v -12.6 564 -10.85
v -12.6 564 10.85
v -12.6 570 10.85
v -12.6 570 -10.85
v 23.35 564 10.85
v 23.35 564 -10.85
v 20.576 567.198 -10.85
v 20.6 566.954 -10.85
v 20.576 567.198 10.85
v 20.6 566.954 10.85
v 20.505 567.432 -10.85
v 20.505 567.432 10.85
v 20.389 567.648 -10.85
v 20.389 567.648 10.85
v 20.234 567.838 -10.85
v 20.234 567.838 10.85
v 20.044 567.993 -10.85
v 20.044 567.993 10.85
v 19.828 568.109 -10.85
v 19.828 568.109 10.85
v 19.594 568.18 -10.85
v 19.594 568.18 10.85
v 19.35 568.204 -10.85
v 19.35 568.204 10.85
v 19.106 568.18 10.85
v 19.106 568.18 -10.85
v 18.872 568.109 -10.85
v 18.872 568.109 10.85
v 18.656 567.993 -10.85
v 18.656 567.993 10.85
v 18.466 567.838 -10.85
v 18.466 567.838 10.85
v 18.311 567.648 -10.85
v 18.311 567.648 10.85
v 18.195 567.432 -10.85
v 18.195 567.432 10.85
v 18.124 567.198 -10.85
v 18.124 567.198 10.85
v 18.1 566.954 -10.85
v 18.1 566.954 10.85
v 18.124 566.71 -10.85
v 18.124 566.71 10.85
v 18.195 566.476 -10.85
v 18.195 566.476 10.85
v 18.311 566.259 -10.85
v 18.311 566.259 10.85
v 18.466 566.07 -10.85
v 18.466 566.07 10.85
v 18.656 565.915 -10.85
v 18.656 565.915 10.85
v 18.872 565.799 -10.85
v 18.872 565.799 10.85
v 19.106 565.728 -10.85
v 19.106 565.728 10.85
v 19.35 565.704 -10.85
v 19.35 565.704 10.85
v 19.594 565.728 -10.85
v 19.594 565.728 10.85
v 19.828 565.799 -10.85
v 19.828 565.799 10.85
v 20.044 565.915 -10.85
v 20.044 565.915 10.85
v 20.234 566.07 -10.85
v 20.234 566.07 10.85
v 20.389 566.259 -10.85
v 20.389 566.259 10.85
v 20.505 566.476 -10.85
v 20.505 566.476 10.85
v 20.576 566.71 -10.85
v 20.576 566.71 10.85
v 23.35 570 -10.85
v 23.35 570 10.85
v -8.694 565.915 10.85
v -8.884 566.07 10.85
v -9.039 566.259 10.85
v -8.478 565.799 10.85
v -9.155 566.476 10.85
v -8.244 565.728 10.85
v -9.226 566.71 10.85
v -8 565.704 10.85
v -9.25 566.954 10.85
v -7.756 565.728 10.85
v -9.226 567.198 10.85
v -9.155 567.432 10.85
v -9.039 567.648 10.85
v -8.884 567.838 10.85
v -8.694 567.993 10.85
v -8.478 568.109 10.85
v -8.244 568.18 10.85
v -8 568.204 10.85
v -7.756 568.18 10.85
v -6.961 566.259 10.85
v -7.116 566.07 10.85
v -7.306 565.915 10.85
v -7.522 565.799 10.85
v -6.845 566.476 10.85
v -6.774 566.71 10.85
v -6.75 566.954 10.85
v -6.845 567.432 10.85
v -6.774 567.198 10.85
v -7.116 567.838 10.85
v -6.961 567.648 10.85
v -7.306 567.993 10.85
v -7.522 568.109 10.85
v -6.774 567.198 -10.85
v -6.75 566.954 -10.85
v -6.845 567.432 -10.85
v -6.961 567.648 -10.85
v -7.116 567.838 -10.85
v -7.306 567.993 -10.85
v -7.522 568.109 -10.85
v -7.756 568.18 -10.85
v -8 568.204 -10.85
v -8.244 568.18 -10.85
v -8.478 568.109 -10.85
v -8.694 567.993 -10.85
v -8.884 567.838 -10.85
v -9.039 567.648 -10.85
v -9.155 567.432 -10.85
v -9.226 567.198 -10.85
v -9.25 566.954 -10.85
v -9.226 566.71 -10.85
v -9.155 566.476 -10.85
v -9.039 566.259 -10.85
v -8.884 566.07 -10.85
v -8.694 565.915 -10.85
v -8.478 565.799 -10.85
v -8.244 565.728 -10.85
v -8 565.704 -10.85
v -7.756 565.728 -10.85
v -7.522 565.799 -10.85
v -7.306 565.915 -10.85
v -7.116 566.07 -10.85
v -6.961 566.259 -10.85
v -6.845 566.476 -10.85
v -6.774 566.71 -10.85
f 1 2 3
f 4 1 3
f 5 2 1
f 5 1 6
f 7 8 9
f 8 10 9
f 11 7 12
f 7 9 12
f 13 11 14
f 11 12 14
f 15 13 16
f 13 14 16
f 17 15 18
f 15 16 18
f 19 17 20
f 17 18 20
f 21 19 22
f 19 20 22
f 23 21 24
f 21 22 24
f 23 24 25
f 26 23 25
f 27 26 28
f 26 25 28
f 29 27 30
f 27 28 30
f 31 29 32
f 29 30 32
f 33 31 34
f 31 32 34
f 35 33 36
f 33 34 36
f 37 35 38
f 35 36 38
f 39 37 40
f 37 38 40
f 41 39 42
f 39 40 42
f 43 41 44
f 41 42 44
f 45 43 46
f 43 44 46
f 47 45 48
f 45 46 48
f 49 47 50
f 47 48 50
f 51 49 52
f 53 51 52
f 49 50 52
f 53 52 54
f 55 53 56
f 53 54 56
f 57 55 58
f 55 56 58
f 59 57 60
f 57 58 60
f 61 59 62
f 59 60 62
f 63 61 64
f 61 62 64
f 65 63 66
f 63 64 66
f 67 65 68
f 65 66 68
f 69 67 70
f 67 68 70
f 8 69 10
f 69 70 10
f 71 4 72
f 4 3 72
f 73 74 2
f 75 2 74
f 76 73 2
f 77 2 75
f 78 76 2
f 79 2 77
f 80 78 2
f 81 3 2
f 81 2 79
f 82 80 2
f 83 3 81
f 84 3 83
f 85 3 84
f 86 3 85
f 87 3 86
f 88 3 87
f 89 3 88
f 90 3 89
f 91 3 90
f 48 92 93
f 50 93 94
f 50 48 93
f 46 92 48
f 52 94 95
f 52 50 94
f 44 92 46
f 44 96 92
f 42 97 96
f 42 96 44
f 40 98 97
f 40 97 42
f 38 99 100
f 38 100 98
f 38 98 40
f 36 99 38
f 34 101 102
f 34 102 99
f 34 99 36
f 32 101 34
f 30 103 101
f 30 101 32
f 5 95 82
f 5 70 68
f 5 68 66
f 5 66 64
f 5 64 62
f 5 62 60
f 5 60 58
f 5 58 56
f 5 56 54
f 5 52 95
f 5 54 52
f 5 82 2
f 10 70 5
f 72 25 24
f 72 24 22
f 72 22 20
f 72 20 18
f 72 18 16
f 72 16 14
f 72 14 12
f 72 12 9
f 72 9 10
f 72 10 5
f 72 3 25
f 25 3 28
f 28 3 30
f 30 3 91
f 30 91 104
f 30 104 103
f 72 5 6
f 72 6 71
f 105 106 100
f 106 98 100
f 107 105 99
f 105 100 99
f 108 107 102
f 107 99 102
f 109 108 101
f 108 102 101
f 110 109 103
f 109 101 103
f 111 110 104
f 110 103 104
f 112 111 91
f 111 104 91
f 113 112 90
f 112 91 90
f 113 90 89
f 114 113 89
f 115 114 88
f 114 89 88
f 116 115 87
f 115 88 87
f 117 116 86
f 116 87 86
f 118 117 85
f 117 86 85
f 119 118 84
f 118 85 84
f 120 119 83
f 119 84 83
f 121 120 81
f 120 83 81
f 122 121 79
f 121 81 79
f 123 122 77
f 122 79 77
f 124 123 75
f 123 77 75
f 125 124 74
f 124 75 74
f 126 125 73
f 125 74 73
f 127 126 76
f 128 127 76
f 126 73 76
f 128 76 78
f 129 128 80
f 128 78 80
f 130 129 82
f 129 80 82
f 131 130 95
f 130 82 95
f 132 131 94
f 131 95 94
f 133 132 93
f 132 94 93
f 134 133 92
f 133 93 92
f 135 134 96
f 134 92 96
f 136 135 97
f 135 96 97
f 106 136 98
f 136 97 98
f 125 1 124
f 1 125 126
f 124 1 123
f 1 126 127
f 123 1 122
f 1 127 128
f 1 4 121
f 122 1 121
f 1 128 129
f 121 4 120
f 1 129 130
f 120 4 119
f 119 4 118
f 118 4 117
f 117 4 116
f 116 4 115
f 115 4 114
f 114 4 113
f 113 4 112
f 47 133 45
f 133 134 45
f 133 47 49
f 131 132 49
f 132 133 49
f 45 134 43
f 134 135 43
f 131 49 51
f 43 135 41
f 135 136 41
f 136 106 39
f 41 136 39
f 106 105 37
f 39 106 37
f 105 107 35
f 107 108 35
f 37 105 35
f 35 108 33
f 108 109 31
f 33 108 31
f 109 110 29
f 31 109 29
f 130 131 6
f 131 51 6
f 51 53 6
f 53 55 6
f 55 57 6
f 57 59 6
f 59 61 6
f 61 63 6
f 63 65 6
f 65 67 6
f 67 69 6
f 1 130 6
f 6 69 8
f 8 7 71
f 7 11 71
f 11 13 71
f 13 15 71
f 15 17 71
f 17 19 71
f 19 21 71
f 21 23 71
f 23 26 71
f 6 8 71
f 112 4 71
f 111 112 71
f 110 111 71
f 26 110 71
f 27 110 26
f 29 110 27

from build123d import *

# Parameters (mm, degrees)
SIDE_W                               = 35.95
SIDE_H                               = 6
AUFSATZ_LINEAR_AUSTRAGEN1_DEPTH      = 10.85
AUFSATZ_LINEAR_AUSTRAGEN1_DEPTH_BACK = 10.85
SKIZZE5_R                            = 1.25
SCHNITT_LINEAR_AUSTRAGEN1_DEPTH      = 11.85
SCHNITT_LINEAR_AUSTRAGEN1_DEPTH_BACK = 11.85


with BuildPart() as part:
    # Side → Aufsatz-Linear austragen1 (new body, two sides)
    with BuildSketch(Plane.XY) as aufsatz_linear_austragen1_sk:
        with Locations((5.375, 567)):
            Rectangle(SIDE_W, SIDE_H)
    extrude(amount=AUFSATZ_LINEAR_AUSTRAGEN1_DEPTH)
    extrude(aufsatz_linear_austragen1_sk.sketch, amount=-AUFSATZ_LINEAR_AUSTRAGEN1_DEPTH_BACK)

    # Skizze5 → Schnitt-Linear austragen1 (cut, two sides)
    with BuildSketch(Plane.XY) as schnitt_linear_austragen1_sk:
        with Locations((-8, 566.953897676)):
            Circle(SKIZZE5_R)
        with Locations((19.35, 566.953897676)):
            Circle(SKIZZE5_R)
    extrude(amount=SCHNITT_LINEAR_AUSTRAGEN1_DEPTH, mode=Mode.SUBTRACT)
    extrude(schnitt_linear_austragen1_sk.sketch, amount=-SCHNITT_LINEAR_AUSTRAGEN1_DEPTH_BACK, mode=Mode.SUBTRACT)


solid = part.part
